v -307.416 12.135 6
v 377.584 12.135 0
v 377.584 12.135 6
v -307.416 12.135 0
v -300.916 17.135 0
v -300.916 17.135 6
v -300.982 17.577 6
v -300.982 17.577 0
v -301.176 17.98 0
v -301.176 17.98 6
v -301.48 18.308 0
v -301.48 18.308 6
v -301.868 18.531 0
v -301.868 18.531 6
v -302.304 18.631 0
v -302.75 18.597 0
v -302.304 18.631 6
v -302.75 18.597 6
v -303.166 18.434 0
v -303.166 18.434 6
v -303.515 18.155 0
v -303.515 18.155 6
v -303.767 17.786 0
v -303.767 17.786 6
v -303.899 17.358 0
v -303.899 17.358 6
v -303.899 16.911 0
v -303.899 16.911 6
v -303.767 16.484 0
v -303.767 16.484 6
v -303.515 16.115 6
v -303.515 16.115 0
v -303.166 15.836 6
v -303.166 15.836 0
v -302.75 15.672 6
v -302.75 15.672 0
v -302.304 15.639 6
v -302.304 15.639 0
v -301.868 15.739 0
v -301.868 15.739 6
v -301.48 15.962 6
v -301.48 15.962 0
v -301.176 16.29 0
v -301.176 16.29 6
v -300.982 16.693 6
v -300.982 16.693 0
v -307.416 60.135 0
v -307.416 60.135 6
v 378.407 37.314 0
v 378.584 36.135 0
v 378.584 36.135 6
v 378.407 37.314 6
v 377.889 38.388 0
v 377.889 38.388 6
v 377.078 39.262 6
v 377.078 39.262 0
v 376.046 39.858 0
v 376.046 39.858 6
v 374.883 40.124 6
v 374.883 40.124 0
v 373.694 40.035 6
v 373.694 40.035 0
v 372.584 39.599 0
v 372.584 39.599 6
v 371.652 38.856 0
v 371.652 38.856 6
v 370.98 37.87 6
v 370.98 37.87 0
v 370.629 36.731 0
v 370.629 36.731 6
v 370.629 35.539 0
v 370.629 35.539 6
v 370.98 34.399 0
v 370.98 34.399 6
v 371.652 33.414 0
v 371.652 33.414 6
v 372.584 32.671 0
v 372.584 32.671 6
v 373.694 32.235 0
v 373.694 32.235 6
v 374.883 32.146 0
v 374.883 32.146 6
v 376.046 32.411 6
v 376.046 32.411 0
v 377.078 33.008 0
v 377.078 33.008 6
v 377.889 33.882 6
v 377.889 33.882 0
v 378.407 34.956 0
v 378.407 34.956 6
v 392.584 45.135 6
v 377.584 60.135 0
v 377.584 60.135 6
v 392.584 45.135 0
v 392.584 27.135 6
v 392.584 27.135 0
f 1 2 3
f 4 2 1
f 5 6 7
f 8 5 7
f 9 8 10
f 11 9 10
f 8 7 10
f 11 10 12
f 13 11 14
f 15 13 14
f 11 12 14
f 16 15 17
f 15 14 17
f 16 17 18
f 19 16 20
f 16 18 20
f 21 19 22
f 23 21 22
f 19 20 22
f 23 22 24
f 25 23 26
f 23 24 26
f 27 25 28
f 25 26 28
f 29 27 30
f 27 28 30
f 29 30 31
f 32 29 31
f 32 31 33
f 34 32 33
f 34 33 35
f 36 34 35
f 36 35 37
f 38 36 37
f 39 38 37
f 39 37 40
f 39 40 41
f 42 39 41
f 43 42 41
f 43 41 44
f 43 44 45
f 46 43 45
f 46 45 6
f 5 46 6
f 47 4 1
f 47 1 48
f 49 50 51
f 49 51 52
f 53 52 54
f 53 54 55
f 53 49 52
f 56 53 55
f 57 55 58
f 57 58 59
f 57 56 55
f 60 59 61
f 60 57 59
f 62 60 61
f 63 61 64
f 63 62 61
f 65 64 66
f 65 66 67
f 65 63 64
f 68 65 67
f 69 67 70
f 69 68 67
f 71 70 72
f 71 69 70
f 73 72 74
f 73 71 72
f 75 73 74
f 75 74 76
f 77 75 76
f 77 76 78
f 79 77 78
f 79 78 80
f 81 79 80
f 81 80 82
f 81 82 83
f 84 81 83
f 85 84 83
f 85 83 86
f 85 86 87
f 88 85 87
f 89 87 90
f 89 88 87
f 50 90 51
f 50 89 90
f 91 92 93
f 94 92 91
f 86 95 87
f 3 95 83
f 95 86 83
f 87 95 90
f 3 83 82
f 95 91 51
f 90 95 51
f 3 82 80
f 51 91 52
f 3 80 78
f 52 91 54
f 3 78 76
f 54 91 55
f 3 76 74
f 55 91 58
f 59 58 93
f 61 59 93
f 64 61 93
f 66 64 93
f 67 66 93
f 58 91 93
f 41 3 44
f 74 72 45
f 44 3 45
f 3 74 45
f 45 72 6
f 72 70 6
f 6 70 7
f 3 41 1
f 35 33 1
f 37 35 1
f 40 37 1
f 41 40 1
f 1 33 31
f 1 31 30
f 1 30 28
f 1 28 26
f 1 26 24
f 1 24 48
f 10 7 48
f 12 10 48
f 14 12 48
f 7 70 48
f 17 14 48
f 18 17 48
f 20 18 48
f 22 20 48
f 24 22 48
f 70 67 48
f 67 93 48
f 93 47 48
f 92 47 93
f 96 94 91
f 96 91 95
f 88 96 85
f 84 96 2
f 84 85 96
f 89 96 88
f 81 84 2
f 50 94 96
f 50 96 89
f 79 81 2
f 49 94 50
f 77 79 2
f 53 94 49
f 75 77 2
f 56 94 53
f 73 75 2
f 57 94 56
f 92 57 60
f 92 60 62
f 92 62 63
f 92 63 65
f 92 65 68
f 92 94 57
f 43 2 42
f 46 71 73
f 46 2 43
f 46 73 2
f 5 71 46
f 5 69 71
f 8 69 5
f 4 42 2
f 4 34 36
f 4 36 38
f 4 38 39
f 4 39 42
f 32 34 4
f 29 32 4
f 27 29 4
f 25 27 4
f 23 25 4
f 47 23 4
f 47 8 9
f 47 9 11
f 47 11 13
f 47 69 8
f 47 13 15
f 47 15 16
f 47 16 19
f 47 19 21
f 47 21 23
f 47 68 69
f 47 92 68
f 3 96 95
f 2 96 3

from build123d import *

# Parameters (mm, degrees)
SKETCH1_R           = 4
BOSS_EXTRUDE1_DEPTH = 6
SKETCH2_R           = 1.5
CUT_EXTRUDE1_DEPTH  = 10


with BuildPart() as part:
    # Sketch1 → Boss-Extrude1 (new body)
    with BuildSketch(Plane.XY):
        Polygon((377.584269663, 60.134831461), (392.584269663, 45.134831461), (392.584269663, 27.134831461), (377.584269663, 12.134831461), (-307.415730337, 12.134831461), (-307.415730337, 60.134831461), align=None)
        with Locations((374.584269663, 36.134831461)):
            Circle(SKETCH1_R, mode=Mode.SUBTRACT)
    extrude(amount=BOSS_EXTRUDE1_DEPTH)

    # Sketch2 → Cut-Extrude1 (cut)
    with BuildSketch(Plane.XY.offset(6)):
        with Locations((-302.415730337, 17.134831461)):
            Circle(SKETCH2_R)
    extrude(amount=-CUT_EXTRUDE1_DEPTH, mode=Mode.SUBTRACT)


solid = part.part
